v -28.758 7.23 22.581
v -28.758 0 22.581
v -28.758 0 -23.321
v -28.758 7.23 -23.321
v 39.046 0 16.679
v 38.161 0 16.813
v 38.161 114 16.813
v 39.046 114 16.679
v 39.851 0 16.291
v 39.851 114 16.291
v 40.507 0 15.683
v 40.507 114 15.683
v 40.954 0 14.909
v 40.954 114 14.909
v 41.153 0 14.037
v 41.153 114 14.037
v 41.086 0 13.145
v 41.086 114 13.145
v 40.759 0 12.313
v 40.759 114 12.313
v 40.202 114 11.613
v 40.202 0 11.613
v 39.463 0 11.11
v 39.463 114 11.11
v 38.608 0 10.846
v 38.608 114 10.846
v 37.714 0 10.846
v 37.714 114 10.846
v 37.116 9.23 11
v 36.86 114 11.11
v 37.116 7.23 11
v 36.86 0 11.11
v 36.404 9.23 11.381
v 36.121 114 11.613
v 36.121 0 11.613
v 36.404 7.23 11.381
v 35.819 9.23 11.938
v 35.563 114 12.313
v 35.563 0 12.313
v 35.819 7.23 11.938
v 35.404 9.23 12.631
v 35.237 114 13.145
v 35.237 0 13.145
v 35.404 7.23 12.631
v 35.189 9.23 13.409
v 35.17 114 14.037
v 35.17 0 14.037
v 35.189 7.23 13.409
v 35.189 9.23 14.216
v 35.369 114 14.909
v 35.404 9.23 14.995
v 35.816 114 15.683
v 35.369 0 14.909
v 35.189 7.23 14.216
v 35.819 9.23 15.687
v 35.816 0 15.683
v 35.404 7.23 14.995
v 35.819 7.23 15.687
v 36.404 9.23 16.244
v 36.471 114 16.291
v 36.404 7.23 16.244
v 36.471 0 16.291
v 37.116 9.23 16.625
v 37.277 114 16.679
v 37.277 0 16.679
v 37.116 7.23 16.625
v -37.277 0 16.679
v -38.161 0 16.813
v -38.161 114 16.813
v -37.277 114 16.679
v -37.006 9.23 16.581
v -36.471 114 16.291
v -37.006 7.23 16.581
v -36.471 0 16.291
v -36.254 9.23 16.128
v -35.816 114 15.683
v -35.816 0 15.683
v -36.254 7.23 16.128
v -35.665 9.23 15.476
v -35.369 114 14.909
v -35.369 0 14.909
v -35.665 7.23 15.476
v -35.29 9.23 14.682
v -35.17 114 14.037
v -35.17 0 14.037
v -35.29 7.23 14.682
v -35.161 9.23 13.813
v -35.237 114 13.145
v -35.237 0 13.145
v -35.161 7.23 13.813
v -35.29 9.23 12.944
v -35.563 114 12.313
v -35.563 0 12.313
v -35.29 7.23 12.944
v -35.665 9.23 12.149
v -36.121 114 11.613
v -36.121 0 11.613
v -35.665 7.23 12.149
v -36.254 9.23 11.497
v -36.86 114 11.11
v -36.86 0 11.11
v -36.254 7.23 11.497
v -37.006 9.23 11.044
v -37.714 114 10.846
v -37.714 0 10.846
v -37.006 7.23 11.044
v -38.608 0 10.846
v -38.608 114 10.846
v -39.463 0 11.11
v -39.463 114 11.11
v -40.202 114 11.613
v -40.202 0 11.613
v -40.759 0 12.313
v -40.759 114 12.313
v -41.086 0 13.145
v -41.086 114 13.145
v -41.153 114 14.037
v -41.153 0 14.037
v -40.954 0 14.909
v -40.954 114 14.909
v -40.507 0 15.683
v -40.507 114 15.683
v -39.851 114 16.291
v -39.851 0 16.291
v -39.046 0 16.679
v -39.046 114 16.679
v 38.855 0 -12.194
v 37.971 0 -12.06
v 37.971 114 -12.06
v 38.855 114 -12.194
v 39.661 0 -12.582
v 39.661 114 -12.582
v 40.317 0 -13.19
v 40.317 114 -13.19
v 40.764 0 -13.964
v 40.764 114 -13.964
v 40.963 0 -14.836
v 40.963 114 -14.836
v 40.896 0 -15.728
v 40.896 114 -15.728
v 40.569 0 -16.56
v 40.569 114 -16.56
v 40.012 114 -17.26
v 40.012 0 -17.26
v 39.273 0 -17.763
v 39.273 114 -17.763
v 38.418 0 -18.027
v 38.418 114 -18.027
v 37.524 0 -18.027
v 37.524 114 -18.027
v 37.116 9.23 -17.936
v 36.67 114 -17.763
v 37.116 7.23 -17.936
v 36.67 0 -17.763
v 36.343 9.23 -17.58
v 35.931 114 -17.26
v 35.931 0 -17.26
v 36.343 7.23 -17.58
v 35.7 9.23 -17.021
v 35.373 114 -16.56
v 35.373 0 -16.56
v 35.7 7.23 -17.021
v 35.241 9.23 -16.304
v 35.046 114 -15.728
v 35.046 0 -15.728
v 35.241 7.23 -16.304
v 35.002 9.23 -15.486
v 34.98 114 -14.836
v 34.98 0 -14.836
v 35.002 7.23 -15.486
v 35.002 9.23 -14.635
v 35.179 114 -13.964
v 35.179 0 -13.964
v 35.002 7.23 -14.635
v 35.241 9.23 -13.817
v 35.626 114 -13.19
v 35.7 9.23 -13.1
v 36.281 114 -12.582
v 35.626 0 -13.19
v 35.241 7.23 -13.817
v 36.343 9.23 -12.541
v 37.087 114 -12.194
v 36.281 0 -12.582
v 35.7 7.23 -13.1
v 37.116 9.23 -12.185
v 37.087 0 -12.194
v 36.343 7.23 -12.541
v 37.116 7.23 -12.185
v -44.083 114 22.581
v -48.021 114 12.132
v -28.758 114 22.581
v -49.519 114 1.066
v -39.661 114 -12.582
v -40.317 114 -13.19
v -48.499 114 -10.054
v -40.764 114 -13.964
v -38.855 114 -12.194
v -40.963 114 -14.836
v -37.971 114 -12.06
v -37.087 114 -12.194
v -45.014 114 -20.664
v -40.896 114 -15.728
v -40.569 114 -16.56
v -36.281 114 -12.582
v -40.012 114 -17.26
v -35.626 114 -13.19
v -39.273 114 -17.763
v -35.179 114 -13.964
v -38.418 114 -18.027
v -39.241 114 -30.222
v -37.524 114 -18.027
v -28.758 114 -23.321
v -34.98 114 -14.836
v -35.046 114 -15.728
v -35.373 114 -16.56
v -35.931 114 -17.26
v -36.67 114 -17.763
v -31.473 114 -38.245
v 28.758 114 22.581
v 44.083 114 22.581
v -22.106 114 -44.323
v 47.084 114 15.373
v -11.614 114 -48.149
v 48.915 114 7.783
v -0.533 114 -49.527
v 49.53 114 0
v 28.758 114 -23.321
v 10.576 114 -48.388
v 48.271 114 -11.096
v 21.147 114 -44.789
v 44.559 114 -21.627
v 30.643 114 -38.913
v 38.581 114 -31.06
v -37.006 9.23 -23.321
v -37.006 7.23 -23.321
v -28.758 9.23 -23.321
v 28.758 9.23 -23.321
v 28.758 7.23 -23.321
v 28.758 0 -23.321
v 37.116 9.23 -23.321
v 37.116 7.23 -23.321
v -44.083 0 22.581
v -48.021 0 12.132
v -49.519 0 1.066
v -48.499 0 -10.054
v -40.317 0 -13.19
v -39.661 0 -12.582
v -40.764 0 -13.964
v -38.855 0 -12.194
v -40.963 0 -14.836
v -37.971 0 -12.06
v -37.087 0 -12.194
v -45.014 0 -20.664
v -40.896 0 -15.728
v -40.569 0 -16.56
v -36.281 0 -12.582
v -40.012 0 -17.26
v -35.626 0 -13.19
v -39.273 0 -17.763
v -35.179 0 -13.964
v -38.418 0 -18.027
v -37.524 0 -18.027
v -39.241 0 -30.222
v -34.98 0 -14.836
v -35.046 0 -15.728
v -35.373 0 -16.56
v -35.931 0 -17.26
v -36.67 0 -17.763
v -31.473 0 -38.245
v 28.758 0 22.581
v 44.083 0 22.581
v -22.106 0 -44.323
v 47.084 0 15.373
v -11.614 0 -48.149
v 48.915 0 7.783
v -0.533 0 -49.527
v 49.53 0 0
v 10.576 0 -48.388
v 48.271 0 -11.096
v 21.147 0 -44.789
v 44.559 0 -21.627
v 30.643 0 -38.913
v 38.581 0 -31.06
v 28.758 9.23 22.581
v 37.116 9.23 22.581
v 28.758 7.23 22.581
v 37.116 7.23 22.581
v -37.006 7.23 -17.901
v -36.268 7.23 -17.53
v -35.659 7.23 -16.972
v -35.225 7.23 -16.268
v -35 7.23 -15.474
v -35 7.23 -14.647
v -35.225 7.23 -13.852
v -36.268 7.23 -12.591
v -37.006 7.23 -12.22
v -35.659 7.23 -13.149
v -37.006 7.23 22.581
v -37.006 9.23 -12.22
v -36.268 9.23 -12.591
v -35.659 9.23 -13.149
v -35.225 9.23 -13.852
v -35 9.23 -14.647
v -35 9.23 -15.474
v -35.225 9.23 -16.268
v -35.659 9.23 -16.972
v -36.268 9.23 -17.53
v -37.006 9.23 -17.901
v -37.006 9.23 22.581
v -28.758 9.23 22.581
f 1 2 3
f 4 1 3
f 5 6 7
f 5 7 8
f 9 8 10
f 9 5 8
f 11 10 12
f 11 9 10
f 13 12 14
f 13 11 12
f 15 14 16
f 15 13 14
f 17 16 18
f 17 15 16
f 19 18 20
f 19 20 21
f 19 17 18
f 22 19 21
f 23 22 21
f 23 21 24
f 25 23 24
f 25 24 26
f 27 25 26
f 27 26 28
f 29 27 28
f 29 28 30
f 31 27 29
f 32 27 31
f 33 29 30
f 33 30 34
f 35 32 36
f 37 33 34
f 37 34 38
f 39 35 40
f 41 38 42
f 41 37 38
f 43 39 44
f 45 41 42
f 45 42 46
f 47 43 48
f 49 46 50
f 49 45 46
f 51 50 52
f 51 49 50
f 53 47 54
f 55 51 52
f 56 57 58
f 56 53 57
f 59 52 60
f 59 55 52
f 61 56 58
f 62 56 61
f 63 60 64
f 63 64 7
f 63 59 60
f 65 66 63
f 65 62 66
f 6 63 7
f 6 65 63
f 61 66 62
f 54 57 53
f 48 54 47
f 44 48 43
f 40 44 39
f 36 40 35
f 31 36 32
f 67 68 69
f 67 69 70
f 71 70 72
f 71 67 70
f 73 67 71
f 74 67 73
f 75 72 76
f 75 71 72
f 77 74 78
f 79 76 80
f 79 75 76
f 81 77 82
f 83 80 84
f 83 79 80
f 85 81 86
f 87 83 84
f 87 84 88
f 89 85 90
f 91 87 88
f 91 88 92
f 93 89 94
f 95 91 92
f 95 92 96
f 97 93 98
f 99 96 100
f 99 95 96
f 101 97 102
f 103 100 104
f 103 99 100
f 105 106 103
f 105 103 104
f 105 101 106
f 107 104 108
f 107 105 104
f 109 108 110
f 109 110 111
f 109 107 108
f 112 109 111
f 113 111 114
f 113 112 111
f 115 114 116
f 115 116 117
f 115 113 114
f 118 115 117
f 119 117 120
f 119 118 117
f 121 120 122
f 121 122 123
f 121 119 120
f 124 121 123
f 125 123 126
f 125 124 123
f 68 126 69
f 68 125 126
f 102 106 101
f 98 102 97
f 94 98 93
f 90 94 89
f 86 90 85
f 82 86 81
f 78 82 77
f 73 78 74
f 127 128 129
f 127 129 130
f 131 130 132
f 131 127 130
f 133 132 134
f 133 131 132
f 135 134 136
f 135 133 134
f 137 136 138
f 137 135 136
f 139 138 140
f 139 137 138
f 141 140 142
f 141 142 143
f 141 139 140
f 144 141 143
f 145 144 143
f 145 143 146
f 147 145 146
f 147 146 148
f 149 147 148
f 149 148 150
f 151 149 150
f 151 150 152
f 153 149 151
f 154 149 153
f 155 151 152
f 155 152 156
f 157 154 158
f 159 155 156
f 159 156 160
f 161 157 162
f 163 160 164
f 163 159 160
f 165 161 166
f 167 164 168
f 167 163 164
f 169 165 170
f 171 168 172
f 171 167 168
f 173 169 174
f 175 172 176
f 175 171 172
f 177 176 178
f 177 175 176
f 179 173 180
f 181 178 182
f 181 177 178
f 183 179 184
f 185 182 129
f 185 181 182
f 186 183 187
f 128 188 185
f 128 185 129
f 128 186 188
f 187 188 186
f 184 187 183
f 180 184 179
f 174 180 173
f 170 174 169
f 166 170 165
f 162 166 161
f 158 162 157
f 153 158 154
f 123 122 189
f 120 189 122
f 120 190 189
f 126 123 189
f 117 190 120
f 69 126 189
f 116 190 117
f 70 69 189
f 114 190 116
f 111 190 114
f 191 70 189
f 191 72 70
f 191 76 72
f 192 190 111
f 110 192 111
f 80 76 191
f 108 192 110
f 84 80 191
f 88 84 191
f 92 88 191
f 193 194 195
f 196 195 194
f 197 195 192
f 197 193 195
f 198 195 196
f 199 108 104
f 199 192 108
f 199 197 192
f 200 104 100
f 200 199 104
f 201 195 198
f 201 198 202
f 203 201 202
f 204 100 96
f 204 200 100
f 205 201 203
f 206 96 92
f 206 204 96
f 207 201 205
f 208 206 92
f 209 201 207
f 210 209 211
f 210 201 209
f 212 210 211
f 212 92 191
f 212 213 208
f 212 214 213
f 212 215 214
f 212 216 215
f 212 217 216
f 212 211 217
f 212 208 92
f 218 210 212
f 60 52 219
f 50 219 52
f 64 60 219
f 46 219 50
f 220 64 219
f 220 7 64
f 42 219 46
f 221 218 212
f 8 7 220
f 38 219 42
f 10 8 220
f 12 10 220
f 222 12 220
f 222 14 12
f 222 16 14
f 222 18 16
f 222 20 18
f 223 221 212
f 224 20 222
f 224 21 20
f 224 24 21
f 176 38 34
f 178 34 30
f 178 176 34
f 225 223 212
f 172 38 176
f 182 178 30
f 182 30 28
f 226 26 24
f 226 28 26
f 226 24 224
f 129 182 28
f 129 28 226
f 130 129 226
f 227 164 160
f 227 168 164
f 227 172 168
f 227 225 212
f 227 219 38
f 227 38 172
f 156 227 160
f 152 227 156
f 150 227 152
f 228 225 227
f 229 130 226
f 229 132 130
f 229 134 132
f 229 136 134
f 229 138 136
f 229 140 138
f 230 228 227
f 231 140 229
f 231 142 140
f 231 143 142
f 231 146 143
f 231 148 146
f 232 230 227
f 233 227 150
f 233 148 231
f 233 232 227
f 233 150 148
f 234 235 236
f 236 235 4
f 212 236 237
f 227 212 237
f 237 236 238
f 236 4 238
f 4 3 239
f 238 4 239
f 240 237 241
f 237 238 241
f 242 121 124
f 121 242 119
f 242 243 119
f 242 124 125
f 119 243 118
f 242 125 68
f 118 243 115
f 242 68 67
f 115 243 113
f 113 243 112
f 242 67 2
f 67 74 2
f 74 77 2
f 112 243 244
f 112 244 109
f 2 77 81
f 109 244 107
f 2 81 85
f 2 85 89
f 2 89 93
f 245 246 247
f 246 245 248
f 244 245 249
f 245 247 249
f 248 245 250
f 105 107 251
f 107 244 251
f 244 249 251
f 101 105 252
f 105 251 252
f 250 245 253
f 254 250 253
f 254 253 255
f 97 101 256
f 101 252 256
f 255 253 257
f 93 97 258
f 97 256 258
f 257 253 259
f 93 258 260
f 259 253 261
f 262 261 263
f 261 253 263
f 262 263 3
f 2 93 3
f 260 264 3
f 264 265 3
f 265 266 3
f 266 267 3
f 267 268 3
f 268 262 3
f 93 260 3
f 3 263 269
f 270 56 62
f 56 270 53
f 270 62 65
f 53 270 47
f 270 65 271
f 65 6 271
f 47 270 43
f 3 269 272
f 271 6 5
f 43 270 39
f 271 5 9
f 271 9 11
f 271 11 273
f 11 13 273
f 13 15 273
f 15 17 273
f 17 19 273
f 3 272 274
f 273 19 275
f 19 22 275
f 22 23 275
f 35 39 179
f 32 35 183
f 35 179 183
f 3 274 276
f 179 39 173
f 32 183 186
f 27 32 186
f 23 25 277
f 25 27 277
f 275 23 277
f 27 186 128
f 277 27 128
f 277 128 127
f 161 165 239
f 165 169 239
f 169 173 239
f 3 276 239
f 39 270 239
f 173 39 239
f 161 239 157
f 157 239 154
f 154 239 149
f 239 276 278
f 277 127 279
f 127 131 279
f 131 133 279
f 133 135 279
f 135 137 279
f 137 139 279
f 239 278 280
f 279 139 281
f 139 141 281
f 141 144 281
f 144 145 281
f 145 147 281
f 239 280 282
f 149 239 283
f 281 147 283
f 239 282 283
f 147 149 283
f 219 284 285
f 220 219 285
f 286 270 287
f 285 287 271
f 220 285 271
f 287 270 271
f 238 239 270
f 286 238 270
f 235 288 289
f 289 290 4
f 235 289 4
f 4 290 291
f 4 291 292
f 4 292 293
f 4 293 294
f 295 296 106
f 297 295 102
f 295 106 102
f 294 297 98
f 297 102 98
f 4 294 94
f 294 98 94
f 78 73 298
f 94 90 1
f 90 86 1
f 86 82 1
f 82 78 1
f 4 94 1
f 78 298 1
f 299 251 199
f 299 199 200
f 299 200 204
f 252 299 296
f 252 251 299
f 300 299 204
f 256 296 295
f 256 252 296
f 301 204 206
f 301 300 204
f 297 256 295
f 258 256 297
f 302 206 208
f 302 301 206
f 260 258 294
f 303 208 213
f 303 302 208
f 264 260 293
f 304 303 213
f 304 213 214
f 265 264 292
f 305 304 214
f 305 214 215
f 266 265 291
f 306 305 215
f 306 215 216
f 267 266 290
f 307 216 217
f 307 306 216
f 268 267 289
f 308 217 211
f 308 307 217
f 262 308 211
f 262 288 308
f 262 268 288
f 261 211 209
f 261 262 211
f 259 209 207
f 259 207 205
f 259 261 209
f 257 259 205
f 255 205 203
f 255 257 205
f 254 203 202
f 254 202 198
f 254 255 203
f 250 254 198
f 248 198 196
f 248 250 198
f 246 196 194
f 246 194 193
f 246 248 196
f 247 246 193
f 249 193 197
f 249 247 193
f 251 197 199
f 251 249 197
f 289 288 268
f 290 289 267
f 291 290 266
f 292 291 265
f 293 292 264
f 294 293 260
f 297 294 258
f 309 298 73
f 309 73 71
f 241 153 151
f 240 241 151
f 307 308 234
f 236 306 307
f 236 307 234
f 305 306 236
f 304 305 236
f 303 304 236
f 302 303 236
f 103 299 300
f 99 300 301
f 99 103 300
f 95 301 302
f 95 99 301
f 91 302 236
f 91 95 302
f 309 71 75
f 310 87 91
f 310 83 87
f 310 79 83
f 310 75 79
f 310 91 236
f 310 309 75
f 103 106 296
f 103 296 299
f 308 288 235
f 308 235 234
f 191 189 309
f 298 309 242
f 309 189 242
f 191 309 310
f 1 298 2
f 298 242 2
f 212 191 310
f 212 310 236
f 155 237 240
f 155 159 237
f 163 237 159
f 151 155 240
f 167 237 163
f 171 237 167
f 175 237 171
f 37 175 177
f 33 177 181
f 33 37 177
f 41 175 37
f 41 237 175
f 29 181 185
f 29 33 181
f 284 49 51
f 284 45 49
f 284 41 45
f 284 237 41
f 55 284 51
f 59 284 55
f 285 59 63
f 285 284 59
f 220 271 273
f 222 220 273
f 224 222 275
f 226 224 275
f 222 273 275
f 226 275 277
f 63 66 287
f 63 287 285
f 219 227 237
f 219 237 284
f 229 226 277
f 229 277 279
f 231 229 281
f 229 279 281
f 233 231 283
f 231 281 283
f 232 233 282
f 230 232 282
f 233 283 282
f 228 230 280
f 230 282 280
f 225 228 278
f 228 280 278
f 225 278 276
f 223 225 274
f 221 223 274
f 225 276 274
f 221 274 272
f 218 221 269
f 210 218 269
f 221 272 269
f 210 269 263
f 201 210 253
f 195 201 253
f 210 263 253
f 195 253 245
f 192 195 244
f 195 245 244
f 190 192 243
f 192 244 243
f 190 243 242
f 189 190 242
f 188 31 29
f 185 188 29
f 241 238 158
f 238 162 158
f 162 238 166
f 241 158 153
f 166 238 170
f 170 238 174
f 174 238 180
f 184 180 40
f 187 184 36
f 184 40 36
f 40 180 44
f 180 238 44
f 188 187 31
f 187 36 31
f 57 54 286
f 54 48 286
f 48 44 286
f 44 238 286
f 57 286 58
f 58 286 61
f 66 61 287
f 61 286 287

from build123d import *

# Parameters (mm, degrees)
SKETCH1_R           = 3
BOSS_EXTRUDE2_DEPTH = 114
CUT_EXTRUDE1_REACH  = 145.698
SKETCH2_W           = 74.122822233
SKETCH2_H           = 2


with BuildPart() as part:
    # Sketch1 → Boss-Extrude2 (new body)
    with BuildSketch(Plane(origin=(0, 0, 0), x_dir=(1, 0, 0), z_dir=(0, 1, 0))):
        with BuildLine():
            Line((-44.083041608, -22.581105876), (-28.757656934, -22.581105876))
            Line((-28.757656934, -22.581105876), (-28.757656934, 23.321119009))
            Line((-28.757656934, 23.321119009), (28.757656934, 23.321119009))
            Line((28.757656934, 23.321119009), (28.757656934, -22.581105876))
            Line((28.757656934, -22.581105876), (44.083041608, -22.581105876))
            ThreePointArc((44.083041608, -22.581105876), (48.149008042, -11.614384382), (49.53, 0))
            ThreePointArc((49.53, 0), (-11.614384382, 48.149008042), (-44.083041608, -22.581105876))
        make_face()
        with Locations(Location((-38.161341973, -13.812642955, 0), (0, 0, 270))):
            Circle(SKETCH1_R, mode=Mode.SUBTRACT)
        with Locations(Location((38.161341973, -13.812642955, 0), (0, 0, 270))):
            Circle(SKETCH1_R, mode=Mode.SUBTRACT)
        with Locations(Location((-37.971229362, 15.060391099, 0), (0, 0, 270))):
            Circle(SKETCH1_R, mode=Mode.SUBTRACT)
        with Locations(Location((37.971229362, 15.060391099, 0), (0, 0, 270))):
            Circle(SKETCH1_R, mode=Mode.SUBTRACT)
    extrude(amount=BOSS_EXTRUDE2_DEPTH)

    # Cut-Extrude1: up to this face of the body (flat: up to its plane)
    cut_extrude1_end = Plane(part.part.faces().sort_by_distance((0, 57, -23.321119009))[0])
    # Sketch2 → Cut-Extrude1 (cut, up to the picked face)
    with BuildSketch(Plane.XY.offset(22.581105876), mode=Mode.PRIVATE) as cut_extrude1_sk1:
        with Locations((0.055039457, 8.229827968)):
            Rectangle(SKETCH2_W, SKETCH2_H)
    cut_extrude1_tool1 = split(extrude(cut_extrude1_sk1.sketch, amount=-CUT_EXTRUDE1_REACH, mode=Mode.PRIVATE), bisect_by=cut_extrude1_end, keep=Keep.BOTH, mode=Mode.PRIVATE)
    add(cut_extrude1_tool1.solids().sort_by(Axis((0.055039, 8.229828, 22.581106), (0, 0, -1)))[0], mode=Mode.SUBTRACT)


solid = part.part
